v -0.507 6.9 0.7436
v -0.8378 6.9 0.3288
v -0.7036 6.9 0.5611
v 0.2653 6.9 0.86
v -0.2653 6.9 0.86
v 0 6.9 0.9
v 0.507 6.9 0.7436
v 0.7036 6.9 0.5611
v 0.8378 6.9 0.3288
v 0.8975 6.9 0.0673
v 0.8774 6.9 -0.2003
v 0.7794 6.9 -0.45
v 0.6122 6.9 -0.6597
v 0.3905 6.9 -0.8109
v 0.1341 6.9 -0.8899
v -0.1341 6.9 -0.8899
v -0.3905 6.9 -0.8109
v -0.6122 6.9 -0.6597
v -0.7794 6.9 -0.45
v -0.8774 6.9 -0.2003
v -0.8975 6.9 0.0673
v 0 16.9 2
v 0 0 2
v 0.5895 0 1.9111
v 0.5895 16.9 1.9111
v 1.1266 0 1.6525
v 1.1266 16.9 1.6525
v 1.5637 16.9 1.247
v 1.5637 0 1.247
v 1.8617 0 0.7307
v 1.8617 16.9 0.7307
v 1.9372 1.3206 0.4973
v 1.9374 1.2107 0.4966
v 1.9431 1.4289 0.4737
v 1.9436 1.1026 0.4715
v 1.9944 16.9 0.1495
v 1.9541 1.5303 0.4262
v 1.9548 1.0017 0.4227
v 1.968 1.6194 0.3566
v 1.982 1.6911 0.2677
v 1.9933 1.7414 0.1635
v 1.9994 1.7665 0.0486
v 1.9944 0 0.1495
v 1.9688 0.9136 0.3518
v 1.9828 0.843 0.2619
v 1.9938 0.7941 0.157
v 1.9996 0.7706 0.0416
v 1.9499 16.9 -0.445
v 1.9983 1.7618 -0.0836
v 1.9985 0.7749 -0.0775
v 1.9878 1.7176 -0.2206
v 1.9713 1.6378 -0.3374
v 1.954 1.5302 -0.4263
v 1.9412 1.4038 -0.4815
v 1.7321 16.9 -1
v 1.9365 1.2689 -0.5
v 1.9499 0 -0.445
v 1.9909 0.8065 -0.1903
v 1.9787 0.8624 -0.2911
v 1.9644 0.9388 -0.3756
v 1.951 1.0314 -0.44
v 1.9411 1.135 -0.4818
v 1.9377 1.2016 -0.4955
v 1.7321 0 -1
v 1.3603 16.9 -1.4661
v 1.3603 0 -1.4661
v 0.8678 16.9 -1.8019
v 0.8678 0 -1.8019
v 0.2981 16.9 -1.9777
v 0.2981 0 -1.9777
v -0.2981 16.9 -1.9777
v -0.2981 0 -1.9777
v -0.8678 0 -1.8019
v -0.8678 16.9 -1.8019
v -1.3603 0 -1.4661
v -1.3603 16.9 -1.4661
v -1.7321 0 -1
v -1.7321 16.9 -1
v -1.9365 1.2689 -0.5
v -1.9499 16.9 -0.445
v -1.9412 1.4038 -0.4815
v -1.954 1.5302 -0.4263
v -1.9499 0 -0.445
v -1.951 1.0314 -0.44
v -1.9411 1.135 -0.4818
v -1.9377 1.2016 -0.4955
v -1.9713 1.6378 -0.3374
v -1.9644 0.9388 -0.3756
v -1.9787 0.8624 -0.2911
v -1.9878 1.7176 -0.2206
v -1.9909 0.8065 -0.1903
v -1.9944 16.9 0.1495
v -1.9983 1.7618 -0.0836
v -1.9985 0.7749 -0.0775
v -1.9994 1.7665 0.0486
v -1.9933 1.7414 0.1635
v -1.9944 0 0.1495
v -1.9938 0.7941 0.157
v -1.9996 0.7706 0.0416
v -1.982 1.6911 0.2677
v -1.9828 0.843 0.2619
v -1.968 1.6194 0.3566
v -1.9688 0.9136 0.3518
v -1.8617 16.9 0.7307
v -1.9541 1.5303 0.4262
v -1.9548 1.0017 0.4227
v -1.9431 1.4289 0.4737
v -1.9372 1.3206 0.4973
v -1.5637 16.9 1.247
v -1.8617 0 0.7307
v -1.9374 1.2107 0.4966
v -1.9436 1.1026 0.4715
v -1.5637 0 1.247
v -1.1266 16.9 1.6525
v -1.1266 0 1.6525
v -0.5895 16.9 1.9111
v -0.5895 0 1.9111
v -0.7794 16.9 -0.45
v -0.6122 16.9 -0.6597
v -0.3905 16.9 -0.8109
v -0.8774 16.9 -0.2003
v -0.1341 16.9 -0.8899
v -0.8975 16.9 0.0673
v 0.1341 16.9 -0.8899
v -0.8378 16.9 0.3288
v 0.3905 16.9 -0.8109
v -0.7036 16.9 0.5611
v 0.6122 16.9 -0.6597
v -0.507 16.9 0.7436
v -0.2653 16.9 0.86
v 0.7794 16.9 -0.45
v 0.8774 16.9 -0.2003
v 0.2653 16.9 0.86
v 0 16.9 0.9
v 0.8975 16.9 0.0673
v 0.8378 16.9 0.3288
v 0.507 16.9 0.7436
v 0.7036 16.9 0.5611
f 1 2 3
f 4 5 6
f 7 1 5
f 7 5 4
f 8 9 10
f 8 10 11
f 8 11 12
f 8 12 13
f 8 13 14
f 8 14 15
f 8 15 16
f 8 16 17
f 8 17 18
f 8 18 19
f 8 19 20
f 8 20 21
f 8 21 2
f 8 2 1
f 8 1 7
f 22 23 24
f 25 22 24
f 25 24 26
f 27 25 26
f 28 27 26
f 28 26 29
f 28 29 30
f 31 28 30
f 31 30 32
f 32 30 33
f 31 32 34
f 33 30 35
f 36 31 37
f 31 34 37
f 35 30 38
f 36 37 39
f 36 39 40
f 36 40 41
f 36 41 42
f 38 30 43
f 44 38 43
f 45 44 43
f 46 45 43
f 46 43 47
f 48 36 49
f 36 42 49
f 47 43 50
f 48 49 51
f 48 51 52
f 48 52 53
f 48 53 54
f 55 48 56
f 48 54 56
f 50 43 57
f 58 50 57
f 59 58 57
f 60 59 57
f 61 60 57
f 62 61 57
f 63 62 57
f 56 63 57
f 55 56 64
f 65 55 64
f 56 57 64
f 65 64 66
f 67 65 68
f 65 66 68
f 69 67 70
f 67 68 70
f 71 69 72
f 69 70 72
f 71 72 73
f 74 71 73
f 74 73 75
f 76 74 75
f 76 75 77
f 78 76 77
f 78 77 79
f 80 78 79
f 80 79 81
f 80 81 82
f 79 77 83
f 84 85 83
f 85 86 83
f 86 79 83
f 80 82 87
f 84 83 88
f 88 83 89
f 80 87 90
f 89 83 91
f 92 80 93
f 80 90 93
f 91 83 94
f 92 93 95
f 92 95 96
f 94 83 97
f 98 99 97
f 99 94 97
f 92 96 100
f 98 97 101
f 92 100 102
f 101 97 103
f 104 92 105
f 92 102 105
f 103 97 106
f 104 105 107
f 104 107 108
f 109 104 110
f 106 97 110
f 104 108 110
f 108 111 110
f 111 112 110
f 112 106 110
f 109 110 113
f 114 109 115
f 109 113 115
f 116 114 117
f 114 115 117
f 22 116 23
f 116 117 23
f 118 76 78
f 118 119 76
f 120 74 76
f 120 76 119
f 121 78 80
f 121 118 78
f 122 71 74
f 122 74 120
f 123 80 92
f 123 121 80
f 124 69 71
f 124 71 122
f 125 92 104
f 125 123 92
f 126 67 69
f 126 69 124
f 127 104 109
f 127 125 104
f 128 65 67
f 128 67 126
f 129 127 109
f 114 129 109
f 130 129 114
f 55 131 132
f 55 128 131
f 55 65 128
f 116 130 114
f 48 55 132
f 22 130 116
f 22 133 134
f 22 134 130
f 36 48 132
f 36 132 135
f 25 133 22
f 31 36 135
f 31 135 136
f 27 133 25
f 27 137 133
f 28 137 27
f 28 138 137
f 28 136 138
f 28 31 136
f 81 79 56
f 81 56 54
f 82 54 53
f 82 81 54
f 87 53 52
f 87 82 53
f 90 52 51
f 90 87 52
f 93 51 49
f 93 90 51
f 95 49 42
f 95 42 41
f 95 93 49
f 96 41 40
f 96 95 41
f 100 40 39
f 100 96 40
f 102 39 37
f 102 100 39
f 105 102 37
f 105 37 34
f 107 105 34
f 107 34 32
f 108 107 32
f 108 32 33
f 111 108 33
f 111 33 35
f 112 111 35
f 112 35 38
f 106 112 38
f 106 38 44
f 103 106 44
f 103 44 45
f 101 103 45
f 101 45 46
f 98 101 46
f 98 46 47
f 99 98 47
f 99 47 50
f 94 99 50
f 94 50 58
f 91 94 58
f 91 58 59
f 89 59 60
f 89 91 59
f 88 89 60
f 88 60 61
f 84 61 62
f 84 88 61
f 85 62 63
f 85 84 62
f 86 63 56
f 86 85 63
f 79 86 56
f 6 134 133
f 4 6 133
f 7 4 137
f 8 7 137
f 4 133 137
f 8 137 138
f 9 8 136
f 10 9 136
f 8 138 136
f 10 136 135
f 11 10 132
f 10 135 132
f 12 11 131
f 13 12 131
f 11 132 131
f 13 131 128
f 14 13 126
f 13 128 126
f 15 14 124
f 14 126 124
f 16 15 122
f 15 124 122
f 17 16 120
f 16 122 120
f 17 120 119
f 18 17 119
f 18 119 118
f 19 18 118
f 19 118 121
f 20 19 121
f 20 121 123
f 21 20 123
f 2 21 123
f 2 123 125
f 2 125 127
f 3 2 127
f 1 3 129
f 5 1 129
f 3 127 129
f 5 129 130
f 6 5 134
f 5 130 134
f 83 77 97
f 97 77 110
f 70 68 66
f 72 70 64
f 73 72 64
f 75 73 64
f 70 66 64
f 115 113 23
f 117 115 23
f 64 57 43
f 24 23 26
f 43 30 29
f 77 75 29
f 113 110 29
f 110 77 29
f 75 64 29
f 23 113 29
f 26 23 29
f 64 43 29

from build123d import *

# Parameters (mm, degrees)
SZKIC1_R                        = 2
DODANIE_WYCI_GNI_CIE1_DEPTH     = 16.9
SZKIC2_R                        = 0.9
WYTNIJ_WYCI_GNI_CIE1_DEPTH      = 10
WYTNIJ_WYCI_GNI_CIE2_DEPTH      = 18.135051794
WYTNIJ_WYCI_GNI_CIE2_DEPTH_BACK = 18.135051794
SZKIC3_R                        = 0.5


with BuildPart() as part:
    # Szkic1 → Dodanie-wyciągnięcie1 (new body)
    with BuildSketch(Plane(origin=(0, 0, 0), x_dir=(1, 0, 0), z_dir=(0, 1, 0))):
        with Locations(Location((0, 0, 0), (0, 0, 270))):
            Circle(SZKIC1_R)
    extrude(amount=DODANIE_WYCI_GNI_CIE1_DEPTH)

    # Szkic2 → Wytnij-wyciągnięcie1 (cut)
    with BuildSketch(Plane(origin=(0, 16.9, 0), x_dir=(1, 0, 0), z_dir=(0, 1, 0))):
        with Locations(Location((0, 0, 0), (0, 0, 270))):
            Circle(SZKIC2_R)
    extrude(amount=-WYTNIJ_WYCI_GNI_CIE1_DEPTH, mode=Mode.SUBTRACT)

    # Szkic3 → Wytnij-wyciągnięcie2 (cut, two sides: drawn at the far end of the back side and taken through both)
    with BuildSketch(Plane(origin=(0, 0, 0), x_dir=(0, 0, -1), z_dir=(1, 0, 0)).offset(-WYTNIJ_WYCI_GNI_CIE2_DEPTH_BACK)):
        with Locations((0, 1.268865349)):
            Circle(SZKIC3_R)
    extrude(amount=WYTNIJ_WYCI_GNI_CIE2_DEPTH + WYTNIJ_WYCI_GNI_CIE2_DEPTH_BACK, mode=Mode.SUBTRACT)


solid = part.part
